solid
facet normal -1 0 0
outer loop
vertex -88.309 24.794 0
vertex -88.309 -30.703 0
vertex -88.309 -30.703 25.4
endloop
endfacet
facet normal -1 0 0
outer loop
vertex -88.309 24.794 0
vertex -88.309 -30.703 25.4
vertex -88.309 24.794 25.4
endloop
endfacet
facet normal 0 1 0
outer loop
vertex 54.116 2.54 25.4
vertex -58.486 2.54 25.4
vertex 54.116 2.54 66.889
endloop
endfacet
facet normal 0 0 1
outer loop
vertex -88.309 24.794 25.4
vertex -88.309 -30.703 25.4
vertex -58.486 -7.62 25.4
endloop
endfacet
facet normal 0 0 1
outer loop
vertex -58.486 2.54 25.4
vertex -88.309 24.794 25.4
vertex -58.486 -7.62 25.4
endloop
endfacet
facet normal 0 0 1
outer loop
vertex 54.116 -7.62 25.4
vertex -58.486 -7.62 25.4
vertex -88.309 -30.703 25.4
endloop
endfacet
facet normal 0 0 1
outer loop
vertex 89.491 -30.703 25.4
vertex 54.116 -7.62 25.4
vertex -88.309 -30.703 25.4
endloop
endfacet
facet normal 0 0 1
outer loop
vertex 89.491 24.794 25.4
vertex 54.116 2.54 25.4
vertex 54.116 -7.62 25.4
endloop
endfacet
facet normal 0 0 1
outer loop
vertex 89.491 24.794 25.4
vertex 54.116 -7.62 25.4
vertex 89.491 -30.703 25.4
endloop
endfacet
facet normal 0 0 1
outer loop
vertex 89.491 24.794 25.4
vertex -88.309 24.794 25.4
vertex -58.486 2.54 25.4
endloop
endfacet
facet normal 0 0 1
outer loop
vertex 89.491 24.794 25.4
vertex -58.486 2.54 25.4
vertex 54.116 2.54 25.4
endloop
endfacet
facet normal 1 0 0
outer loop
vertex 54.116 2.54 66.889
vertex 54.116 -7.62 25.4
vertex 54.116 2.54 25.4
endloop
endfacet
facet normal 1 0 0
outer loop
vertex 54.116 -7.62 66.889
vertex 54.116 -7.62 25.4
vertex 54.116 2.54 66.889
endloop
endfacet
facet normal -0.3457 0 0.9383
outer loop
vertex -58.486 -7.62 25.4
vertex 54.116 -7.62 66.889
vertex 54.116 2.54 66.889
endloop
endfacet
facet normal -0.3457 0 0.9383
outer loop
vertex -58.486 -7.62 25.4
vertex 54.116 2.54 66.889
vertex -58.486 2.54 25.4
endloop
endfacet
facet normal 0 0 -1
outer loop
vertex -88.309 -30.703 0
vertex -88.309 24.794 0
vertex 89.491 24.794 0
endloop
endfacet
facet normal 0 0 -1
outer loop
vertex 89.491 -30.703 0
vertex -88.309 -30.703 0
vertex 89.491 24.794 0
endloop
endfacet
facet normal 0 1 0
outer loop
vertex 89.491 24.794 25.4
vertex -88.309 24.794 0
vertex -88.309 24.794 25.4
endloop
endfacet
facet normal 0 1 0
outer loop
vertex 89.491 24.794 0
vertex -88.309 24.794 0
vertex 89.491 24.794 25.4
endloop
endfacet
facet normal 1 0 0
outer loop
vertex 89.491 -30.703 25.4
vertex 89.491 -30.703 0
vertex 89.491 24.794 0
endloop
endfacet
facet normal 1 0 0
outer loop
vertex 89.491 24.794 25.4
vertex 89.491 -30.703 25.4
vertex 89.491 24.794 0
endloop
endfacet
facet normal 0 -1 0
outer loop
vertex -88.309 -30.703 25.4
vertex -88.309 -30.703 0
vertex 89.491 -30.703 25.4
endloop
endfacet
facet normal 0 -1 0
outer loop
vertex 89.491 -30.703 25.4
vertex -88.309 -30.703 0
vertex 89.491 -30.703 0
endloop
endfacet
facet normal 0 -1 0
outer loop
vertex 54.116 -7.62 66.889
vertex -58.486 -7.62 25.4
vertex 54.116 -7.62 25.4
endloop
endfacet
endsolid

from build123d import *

# Parameters (mm, degrees)
F0_W          = 177.8
F0_H          = 55.496745
F1_DEPTH      = 25.4
F3_DEPTH      = 7.62
F3_DEPTH_BACK = 2.54


with BuildPart() as f1:
    # F0 (on Top) → F1 (new body)
    with BuildSketch(Plane.XY):
        with Locations((0.590887, -2.954431)):
            Rectangle(F0_W, F0_H)
    extrude(amount=F1_DEPTH)

    # F2 (on Front) → F3 (join, two sides)
    with BuildSketch(Plane.XZ) as f3_sk:
        Polygon((54.116055, 66.88869), (-58.625646, 25.348367), (54.116055, 25.078142), align=None)
    extrude(amount=F3_DEPTH)
    extrude(f3_sk.sketch, amount=-F3_DEPTH_BACK)


solid = f1.part
